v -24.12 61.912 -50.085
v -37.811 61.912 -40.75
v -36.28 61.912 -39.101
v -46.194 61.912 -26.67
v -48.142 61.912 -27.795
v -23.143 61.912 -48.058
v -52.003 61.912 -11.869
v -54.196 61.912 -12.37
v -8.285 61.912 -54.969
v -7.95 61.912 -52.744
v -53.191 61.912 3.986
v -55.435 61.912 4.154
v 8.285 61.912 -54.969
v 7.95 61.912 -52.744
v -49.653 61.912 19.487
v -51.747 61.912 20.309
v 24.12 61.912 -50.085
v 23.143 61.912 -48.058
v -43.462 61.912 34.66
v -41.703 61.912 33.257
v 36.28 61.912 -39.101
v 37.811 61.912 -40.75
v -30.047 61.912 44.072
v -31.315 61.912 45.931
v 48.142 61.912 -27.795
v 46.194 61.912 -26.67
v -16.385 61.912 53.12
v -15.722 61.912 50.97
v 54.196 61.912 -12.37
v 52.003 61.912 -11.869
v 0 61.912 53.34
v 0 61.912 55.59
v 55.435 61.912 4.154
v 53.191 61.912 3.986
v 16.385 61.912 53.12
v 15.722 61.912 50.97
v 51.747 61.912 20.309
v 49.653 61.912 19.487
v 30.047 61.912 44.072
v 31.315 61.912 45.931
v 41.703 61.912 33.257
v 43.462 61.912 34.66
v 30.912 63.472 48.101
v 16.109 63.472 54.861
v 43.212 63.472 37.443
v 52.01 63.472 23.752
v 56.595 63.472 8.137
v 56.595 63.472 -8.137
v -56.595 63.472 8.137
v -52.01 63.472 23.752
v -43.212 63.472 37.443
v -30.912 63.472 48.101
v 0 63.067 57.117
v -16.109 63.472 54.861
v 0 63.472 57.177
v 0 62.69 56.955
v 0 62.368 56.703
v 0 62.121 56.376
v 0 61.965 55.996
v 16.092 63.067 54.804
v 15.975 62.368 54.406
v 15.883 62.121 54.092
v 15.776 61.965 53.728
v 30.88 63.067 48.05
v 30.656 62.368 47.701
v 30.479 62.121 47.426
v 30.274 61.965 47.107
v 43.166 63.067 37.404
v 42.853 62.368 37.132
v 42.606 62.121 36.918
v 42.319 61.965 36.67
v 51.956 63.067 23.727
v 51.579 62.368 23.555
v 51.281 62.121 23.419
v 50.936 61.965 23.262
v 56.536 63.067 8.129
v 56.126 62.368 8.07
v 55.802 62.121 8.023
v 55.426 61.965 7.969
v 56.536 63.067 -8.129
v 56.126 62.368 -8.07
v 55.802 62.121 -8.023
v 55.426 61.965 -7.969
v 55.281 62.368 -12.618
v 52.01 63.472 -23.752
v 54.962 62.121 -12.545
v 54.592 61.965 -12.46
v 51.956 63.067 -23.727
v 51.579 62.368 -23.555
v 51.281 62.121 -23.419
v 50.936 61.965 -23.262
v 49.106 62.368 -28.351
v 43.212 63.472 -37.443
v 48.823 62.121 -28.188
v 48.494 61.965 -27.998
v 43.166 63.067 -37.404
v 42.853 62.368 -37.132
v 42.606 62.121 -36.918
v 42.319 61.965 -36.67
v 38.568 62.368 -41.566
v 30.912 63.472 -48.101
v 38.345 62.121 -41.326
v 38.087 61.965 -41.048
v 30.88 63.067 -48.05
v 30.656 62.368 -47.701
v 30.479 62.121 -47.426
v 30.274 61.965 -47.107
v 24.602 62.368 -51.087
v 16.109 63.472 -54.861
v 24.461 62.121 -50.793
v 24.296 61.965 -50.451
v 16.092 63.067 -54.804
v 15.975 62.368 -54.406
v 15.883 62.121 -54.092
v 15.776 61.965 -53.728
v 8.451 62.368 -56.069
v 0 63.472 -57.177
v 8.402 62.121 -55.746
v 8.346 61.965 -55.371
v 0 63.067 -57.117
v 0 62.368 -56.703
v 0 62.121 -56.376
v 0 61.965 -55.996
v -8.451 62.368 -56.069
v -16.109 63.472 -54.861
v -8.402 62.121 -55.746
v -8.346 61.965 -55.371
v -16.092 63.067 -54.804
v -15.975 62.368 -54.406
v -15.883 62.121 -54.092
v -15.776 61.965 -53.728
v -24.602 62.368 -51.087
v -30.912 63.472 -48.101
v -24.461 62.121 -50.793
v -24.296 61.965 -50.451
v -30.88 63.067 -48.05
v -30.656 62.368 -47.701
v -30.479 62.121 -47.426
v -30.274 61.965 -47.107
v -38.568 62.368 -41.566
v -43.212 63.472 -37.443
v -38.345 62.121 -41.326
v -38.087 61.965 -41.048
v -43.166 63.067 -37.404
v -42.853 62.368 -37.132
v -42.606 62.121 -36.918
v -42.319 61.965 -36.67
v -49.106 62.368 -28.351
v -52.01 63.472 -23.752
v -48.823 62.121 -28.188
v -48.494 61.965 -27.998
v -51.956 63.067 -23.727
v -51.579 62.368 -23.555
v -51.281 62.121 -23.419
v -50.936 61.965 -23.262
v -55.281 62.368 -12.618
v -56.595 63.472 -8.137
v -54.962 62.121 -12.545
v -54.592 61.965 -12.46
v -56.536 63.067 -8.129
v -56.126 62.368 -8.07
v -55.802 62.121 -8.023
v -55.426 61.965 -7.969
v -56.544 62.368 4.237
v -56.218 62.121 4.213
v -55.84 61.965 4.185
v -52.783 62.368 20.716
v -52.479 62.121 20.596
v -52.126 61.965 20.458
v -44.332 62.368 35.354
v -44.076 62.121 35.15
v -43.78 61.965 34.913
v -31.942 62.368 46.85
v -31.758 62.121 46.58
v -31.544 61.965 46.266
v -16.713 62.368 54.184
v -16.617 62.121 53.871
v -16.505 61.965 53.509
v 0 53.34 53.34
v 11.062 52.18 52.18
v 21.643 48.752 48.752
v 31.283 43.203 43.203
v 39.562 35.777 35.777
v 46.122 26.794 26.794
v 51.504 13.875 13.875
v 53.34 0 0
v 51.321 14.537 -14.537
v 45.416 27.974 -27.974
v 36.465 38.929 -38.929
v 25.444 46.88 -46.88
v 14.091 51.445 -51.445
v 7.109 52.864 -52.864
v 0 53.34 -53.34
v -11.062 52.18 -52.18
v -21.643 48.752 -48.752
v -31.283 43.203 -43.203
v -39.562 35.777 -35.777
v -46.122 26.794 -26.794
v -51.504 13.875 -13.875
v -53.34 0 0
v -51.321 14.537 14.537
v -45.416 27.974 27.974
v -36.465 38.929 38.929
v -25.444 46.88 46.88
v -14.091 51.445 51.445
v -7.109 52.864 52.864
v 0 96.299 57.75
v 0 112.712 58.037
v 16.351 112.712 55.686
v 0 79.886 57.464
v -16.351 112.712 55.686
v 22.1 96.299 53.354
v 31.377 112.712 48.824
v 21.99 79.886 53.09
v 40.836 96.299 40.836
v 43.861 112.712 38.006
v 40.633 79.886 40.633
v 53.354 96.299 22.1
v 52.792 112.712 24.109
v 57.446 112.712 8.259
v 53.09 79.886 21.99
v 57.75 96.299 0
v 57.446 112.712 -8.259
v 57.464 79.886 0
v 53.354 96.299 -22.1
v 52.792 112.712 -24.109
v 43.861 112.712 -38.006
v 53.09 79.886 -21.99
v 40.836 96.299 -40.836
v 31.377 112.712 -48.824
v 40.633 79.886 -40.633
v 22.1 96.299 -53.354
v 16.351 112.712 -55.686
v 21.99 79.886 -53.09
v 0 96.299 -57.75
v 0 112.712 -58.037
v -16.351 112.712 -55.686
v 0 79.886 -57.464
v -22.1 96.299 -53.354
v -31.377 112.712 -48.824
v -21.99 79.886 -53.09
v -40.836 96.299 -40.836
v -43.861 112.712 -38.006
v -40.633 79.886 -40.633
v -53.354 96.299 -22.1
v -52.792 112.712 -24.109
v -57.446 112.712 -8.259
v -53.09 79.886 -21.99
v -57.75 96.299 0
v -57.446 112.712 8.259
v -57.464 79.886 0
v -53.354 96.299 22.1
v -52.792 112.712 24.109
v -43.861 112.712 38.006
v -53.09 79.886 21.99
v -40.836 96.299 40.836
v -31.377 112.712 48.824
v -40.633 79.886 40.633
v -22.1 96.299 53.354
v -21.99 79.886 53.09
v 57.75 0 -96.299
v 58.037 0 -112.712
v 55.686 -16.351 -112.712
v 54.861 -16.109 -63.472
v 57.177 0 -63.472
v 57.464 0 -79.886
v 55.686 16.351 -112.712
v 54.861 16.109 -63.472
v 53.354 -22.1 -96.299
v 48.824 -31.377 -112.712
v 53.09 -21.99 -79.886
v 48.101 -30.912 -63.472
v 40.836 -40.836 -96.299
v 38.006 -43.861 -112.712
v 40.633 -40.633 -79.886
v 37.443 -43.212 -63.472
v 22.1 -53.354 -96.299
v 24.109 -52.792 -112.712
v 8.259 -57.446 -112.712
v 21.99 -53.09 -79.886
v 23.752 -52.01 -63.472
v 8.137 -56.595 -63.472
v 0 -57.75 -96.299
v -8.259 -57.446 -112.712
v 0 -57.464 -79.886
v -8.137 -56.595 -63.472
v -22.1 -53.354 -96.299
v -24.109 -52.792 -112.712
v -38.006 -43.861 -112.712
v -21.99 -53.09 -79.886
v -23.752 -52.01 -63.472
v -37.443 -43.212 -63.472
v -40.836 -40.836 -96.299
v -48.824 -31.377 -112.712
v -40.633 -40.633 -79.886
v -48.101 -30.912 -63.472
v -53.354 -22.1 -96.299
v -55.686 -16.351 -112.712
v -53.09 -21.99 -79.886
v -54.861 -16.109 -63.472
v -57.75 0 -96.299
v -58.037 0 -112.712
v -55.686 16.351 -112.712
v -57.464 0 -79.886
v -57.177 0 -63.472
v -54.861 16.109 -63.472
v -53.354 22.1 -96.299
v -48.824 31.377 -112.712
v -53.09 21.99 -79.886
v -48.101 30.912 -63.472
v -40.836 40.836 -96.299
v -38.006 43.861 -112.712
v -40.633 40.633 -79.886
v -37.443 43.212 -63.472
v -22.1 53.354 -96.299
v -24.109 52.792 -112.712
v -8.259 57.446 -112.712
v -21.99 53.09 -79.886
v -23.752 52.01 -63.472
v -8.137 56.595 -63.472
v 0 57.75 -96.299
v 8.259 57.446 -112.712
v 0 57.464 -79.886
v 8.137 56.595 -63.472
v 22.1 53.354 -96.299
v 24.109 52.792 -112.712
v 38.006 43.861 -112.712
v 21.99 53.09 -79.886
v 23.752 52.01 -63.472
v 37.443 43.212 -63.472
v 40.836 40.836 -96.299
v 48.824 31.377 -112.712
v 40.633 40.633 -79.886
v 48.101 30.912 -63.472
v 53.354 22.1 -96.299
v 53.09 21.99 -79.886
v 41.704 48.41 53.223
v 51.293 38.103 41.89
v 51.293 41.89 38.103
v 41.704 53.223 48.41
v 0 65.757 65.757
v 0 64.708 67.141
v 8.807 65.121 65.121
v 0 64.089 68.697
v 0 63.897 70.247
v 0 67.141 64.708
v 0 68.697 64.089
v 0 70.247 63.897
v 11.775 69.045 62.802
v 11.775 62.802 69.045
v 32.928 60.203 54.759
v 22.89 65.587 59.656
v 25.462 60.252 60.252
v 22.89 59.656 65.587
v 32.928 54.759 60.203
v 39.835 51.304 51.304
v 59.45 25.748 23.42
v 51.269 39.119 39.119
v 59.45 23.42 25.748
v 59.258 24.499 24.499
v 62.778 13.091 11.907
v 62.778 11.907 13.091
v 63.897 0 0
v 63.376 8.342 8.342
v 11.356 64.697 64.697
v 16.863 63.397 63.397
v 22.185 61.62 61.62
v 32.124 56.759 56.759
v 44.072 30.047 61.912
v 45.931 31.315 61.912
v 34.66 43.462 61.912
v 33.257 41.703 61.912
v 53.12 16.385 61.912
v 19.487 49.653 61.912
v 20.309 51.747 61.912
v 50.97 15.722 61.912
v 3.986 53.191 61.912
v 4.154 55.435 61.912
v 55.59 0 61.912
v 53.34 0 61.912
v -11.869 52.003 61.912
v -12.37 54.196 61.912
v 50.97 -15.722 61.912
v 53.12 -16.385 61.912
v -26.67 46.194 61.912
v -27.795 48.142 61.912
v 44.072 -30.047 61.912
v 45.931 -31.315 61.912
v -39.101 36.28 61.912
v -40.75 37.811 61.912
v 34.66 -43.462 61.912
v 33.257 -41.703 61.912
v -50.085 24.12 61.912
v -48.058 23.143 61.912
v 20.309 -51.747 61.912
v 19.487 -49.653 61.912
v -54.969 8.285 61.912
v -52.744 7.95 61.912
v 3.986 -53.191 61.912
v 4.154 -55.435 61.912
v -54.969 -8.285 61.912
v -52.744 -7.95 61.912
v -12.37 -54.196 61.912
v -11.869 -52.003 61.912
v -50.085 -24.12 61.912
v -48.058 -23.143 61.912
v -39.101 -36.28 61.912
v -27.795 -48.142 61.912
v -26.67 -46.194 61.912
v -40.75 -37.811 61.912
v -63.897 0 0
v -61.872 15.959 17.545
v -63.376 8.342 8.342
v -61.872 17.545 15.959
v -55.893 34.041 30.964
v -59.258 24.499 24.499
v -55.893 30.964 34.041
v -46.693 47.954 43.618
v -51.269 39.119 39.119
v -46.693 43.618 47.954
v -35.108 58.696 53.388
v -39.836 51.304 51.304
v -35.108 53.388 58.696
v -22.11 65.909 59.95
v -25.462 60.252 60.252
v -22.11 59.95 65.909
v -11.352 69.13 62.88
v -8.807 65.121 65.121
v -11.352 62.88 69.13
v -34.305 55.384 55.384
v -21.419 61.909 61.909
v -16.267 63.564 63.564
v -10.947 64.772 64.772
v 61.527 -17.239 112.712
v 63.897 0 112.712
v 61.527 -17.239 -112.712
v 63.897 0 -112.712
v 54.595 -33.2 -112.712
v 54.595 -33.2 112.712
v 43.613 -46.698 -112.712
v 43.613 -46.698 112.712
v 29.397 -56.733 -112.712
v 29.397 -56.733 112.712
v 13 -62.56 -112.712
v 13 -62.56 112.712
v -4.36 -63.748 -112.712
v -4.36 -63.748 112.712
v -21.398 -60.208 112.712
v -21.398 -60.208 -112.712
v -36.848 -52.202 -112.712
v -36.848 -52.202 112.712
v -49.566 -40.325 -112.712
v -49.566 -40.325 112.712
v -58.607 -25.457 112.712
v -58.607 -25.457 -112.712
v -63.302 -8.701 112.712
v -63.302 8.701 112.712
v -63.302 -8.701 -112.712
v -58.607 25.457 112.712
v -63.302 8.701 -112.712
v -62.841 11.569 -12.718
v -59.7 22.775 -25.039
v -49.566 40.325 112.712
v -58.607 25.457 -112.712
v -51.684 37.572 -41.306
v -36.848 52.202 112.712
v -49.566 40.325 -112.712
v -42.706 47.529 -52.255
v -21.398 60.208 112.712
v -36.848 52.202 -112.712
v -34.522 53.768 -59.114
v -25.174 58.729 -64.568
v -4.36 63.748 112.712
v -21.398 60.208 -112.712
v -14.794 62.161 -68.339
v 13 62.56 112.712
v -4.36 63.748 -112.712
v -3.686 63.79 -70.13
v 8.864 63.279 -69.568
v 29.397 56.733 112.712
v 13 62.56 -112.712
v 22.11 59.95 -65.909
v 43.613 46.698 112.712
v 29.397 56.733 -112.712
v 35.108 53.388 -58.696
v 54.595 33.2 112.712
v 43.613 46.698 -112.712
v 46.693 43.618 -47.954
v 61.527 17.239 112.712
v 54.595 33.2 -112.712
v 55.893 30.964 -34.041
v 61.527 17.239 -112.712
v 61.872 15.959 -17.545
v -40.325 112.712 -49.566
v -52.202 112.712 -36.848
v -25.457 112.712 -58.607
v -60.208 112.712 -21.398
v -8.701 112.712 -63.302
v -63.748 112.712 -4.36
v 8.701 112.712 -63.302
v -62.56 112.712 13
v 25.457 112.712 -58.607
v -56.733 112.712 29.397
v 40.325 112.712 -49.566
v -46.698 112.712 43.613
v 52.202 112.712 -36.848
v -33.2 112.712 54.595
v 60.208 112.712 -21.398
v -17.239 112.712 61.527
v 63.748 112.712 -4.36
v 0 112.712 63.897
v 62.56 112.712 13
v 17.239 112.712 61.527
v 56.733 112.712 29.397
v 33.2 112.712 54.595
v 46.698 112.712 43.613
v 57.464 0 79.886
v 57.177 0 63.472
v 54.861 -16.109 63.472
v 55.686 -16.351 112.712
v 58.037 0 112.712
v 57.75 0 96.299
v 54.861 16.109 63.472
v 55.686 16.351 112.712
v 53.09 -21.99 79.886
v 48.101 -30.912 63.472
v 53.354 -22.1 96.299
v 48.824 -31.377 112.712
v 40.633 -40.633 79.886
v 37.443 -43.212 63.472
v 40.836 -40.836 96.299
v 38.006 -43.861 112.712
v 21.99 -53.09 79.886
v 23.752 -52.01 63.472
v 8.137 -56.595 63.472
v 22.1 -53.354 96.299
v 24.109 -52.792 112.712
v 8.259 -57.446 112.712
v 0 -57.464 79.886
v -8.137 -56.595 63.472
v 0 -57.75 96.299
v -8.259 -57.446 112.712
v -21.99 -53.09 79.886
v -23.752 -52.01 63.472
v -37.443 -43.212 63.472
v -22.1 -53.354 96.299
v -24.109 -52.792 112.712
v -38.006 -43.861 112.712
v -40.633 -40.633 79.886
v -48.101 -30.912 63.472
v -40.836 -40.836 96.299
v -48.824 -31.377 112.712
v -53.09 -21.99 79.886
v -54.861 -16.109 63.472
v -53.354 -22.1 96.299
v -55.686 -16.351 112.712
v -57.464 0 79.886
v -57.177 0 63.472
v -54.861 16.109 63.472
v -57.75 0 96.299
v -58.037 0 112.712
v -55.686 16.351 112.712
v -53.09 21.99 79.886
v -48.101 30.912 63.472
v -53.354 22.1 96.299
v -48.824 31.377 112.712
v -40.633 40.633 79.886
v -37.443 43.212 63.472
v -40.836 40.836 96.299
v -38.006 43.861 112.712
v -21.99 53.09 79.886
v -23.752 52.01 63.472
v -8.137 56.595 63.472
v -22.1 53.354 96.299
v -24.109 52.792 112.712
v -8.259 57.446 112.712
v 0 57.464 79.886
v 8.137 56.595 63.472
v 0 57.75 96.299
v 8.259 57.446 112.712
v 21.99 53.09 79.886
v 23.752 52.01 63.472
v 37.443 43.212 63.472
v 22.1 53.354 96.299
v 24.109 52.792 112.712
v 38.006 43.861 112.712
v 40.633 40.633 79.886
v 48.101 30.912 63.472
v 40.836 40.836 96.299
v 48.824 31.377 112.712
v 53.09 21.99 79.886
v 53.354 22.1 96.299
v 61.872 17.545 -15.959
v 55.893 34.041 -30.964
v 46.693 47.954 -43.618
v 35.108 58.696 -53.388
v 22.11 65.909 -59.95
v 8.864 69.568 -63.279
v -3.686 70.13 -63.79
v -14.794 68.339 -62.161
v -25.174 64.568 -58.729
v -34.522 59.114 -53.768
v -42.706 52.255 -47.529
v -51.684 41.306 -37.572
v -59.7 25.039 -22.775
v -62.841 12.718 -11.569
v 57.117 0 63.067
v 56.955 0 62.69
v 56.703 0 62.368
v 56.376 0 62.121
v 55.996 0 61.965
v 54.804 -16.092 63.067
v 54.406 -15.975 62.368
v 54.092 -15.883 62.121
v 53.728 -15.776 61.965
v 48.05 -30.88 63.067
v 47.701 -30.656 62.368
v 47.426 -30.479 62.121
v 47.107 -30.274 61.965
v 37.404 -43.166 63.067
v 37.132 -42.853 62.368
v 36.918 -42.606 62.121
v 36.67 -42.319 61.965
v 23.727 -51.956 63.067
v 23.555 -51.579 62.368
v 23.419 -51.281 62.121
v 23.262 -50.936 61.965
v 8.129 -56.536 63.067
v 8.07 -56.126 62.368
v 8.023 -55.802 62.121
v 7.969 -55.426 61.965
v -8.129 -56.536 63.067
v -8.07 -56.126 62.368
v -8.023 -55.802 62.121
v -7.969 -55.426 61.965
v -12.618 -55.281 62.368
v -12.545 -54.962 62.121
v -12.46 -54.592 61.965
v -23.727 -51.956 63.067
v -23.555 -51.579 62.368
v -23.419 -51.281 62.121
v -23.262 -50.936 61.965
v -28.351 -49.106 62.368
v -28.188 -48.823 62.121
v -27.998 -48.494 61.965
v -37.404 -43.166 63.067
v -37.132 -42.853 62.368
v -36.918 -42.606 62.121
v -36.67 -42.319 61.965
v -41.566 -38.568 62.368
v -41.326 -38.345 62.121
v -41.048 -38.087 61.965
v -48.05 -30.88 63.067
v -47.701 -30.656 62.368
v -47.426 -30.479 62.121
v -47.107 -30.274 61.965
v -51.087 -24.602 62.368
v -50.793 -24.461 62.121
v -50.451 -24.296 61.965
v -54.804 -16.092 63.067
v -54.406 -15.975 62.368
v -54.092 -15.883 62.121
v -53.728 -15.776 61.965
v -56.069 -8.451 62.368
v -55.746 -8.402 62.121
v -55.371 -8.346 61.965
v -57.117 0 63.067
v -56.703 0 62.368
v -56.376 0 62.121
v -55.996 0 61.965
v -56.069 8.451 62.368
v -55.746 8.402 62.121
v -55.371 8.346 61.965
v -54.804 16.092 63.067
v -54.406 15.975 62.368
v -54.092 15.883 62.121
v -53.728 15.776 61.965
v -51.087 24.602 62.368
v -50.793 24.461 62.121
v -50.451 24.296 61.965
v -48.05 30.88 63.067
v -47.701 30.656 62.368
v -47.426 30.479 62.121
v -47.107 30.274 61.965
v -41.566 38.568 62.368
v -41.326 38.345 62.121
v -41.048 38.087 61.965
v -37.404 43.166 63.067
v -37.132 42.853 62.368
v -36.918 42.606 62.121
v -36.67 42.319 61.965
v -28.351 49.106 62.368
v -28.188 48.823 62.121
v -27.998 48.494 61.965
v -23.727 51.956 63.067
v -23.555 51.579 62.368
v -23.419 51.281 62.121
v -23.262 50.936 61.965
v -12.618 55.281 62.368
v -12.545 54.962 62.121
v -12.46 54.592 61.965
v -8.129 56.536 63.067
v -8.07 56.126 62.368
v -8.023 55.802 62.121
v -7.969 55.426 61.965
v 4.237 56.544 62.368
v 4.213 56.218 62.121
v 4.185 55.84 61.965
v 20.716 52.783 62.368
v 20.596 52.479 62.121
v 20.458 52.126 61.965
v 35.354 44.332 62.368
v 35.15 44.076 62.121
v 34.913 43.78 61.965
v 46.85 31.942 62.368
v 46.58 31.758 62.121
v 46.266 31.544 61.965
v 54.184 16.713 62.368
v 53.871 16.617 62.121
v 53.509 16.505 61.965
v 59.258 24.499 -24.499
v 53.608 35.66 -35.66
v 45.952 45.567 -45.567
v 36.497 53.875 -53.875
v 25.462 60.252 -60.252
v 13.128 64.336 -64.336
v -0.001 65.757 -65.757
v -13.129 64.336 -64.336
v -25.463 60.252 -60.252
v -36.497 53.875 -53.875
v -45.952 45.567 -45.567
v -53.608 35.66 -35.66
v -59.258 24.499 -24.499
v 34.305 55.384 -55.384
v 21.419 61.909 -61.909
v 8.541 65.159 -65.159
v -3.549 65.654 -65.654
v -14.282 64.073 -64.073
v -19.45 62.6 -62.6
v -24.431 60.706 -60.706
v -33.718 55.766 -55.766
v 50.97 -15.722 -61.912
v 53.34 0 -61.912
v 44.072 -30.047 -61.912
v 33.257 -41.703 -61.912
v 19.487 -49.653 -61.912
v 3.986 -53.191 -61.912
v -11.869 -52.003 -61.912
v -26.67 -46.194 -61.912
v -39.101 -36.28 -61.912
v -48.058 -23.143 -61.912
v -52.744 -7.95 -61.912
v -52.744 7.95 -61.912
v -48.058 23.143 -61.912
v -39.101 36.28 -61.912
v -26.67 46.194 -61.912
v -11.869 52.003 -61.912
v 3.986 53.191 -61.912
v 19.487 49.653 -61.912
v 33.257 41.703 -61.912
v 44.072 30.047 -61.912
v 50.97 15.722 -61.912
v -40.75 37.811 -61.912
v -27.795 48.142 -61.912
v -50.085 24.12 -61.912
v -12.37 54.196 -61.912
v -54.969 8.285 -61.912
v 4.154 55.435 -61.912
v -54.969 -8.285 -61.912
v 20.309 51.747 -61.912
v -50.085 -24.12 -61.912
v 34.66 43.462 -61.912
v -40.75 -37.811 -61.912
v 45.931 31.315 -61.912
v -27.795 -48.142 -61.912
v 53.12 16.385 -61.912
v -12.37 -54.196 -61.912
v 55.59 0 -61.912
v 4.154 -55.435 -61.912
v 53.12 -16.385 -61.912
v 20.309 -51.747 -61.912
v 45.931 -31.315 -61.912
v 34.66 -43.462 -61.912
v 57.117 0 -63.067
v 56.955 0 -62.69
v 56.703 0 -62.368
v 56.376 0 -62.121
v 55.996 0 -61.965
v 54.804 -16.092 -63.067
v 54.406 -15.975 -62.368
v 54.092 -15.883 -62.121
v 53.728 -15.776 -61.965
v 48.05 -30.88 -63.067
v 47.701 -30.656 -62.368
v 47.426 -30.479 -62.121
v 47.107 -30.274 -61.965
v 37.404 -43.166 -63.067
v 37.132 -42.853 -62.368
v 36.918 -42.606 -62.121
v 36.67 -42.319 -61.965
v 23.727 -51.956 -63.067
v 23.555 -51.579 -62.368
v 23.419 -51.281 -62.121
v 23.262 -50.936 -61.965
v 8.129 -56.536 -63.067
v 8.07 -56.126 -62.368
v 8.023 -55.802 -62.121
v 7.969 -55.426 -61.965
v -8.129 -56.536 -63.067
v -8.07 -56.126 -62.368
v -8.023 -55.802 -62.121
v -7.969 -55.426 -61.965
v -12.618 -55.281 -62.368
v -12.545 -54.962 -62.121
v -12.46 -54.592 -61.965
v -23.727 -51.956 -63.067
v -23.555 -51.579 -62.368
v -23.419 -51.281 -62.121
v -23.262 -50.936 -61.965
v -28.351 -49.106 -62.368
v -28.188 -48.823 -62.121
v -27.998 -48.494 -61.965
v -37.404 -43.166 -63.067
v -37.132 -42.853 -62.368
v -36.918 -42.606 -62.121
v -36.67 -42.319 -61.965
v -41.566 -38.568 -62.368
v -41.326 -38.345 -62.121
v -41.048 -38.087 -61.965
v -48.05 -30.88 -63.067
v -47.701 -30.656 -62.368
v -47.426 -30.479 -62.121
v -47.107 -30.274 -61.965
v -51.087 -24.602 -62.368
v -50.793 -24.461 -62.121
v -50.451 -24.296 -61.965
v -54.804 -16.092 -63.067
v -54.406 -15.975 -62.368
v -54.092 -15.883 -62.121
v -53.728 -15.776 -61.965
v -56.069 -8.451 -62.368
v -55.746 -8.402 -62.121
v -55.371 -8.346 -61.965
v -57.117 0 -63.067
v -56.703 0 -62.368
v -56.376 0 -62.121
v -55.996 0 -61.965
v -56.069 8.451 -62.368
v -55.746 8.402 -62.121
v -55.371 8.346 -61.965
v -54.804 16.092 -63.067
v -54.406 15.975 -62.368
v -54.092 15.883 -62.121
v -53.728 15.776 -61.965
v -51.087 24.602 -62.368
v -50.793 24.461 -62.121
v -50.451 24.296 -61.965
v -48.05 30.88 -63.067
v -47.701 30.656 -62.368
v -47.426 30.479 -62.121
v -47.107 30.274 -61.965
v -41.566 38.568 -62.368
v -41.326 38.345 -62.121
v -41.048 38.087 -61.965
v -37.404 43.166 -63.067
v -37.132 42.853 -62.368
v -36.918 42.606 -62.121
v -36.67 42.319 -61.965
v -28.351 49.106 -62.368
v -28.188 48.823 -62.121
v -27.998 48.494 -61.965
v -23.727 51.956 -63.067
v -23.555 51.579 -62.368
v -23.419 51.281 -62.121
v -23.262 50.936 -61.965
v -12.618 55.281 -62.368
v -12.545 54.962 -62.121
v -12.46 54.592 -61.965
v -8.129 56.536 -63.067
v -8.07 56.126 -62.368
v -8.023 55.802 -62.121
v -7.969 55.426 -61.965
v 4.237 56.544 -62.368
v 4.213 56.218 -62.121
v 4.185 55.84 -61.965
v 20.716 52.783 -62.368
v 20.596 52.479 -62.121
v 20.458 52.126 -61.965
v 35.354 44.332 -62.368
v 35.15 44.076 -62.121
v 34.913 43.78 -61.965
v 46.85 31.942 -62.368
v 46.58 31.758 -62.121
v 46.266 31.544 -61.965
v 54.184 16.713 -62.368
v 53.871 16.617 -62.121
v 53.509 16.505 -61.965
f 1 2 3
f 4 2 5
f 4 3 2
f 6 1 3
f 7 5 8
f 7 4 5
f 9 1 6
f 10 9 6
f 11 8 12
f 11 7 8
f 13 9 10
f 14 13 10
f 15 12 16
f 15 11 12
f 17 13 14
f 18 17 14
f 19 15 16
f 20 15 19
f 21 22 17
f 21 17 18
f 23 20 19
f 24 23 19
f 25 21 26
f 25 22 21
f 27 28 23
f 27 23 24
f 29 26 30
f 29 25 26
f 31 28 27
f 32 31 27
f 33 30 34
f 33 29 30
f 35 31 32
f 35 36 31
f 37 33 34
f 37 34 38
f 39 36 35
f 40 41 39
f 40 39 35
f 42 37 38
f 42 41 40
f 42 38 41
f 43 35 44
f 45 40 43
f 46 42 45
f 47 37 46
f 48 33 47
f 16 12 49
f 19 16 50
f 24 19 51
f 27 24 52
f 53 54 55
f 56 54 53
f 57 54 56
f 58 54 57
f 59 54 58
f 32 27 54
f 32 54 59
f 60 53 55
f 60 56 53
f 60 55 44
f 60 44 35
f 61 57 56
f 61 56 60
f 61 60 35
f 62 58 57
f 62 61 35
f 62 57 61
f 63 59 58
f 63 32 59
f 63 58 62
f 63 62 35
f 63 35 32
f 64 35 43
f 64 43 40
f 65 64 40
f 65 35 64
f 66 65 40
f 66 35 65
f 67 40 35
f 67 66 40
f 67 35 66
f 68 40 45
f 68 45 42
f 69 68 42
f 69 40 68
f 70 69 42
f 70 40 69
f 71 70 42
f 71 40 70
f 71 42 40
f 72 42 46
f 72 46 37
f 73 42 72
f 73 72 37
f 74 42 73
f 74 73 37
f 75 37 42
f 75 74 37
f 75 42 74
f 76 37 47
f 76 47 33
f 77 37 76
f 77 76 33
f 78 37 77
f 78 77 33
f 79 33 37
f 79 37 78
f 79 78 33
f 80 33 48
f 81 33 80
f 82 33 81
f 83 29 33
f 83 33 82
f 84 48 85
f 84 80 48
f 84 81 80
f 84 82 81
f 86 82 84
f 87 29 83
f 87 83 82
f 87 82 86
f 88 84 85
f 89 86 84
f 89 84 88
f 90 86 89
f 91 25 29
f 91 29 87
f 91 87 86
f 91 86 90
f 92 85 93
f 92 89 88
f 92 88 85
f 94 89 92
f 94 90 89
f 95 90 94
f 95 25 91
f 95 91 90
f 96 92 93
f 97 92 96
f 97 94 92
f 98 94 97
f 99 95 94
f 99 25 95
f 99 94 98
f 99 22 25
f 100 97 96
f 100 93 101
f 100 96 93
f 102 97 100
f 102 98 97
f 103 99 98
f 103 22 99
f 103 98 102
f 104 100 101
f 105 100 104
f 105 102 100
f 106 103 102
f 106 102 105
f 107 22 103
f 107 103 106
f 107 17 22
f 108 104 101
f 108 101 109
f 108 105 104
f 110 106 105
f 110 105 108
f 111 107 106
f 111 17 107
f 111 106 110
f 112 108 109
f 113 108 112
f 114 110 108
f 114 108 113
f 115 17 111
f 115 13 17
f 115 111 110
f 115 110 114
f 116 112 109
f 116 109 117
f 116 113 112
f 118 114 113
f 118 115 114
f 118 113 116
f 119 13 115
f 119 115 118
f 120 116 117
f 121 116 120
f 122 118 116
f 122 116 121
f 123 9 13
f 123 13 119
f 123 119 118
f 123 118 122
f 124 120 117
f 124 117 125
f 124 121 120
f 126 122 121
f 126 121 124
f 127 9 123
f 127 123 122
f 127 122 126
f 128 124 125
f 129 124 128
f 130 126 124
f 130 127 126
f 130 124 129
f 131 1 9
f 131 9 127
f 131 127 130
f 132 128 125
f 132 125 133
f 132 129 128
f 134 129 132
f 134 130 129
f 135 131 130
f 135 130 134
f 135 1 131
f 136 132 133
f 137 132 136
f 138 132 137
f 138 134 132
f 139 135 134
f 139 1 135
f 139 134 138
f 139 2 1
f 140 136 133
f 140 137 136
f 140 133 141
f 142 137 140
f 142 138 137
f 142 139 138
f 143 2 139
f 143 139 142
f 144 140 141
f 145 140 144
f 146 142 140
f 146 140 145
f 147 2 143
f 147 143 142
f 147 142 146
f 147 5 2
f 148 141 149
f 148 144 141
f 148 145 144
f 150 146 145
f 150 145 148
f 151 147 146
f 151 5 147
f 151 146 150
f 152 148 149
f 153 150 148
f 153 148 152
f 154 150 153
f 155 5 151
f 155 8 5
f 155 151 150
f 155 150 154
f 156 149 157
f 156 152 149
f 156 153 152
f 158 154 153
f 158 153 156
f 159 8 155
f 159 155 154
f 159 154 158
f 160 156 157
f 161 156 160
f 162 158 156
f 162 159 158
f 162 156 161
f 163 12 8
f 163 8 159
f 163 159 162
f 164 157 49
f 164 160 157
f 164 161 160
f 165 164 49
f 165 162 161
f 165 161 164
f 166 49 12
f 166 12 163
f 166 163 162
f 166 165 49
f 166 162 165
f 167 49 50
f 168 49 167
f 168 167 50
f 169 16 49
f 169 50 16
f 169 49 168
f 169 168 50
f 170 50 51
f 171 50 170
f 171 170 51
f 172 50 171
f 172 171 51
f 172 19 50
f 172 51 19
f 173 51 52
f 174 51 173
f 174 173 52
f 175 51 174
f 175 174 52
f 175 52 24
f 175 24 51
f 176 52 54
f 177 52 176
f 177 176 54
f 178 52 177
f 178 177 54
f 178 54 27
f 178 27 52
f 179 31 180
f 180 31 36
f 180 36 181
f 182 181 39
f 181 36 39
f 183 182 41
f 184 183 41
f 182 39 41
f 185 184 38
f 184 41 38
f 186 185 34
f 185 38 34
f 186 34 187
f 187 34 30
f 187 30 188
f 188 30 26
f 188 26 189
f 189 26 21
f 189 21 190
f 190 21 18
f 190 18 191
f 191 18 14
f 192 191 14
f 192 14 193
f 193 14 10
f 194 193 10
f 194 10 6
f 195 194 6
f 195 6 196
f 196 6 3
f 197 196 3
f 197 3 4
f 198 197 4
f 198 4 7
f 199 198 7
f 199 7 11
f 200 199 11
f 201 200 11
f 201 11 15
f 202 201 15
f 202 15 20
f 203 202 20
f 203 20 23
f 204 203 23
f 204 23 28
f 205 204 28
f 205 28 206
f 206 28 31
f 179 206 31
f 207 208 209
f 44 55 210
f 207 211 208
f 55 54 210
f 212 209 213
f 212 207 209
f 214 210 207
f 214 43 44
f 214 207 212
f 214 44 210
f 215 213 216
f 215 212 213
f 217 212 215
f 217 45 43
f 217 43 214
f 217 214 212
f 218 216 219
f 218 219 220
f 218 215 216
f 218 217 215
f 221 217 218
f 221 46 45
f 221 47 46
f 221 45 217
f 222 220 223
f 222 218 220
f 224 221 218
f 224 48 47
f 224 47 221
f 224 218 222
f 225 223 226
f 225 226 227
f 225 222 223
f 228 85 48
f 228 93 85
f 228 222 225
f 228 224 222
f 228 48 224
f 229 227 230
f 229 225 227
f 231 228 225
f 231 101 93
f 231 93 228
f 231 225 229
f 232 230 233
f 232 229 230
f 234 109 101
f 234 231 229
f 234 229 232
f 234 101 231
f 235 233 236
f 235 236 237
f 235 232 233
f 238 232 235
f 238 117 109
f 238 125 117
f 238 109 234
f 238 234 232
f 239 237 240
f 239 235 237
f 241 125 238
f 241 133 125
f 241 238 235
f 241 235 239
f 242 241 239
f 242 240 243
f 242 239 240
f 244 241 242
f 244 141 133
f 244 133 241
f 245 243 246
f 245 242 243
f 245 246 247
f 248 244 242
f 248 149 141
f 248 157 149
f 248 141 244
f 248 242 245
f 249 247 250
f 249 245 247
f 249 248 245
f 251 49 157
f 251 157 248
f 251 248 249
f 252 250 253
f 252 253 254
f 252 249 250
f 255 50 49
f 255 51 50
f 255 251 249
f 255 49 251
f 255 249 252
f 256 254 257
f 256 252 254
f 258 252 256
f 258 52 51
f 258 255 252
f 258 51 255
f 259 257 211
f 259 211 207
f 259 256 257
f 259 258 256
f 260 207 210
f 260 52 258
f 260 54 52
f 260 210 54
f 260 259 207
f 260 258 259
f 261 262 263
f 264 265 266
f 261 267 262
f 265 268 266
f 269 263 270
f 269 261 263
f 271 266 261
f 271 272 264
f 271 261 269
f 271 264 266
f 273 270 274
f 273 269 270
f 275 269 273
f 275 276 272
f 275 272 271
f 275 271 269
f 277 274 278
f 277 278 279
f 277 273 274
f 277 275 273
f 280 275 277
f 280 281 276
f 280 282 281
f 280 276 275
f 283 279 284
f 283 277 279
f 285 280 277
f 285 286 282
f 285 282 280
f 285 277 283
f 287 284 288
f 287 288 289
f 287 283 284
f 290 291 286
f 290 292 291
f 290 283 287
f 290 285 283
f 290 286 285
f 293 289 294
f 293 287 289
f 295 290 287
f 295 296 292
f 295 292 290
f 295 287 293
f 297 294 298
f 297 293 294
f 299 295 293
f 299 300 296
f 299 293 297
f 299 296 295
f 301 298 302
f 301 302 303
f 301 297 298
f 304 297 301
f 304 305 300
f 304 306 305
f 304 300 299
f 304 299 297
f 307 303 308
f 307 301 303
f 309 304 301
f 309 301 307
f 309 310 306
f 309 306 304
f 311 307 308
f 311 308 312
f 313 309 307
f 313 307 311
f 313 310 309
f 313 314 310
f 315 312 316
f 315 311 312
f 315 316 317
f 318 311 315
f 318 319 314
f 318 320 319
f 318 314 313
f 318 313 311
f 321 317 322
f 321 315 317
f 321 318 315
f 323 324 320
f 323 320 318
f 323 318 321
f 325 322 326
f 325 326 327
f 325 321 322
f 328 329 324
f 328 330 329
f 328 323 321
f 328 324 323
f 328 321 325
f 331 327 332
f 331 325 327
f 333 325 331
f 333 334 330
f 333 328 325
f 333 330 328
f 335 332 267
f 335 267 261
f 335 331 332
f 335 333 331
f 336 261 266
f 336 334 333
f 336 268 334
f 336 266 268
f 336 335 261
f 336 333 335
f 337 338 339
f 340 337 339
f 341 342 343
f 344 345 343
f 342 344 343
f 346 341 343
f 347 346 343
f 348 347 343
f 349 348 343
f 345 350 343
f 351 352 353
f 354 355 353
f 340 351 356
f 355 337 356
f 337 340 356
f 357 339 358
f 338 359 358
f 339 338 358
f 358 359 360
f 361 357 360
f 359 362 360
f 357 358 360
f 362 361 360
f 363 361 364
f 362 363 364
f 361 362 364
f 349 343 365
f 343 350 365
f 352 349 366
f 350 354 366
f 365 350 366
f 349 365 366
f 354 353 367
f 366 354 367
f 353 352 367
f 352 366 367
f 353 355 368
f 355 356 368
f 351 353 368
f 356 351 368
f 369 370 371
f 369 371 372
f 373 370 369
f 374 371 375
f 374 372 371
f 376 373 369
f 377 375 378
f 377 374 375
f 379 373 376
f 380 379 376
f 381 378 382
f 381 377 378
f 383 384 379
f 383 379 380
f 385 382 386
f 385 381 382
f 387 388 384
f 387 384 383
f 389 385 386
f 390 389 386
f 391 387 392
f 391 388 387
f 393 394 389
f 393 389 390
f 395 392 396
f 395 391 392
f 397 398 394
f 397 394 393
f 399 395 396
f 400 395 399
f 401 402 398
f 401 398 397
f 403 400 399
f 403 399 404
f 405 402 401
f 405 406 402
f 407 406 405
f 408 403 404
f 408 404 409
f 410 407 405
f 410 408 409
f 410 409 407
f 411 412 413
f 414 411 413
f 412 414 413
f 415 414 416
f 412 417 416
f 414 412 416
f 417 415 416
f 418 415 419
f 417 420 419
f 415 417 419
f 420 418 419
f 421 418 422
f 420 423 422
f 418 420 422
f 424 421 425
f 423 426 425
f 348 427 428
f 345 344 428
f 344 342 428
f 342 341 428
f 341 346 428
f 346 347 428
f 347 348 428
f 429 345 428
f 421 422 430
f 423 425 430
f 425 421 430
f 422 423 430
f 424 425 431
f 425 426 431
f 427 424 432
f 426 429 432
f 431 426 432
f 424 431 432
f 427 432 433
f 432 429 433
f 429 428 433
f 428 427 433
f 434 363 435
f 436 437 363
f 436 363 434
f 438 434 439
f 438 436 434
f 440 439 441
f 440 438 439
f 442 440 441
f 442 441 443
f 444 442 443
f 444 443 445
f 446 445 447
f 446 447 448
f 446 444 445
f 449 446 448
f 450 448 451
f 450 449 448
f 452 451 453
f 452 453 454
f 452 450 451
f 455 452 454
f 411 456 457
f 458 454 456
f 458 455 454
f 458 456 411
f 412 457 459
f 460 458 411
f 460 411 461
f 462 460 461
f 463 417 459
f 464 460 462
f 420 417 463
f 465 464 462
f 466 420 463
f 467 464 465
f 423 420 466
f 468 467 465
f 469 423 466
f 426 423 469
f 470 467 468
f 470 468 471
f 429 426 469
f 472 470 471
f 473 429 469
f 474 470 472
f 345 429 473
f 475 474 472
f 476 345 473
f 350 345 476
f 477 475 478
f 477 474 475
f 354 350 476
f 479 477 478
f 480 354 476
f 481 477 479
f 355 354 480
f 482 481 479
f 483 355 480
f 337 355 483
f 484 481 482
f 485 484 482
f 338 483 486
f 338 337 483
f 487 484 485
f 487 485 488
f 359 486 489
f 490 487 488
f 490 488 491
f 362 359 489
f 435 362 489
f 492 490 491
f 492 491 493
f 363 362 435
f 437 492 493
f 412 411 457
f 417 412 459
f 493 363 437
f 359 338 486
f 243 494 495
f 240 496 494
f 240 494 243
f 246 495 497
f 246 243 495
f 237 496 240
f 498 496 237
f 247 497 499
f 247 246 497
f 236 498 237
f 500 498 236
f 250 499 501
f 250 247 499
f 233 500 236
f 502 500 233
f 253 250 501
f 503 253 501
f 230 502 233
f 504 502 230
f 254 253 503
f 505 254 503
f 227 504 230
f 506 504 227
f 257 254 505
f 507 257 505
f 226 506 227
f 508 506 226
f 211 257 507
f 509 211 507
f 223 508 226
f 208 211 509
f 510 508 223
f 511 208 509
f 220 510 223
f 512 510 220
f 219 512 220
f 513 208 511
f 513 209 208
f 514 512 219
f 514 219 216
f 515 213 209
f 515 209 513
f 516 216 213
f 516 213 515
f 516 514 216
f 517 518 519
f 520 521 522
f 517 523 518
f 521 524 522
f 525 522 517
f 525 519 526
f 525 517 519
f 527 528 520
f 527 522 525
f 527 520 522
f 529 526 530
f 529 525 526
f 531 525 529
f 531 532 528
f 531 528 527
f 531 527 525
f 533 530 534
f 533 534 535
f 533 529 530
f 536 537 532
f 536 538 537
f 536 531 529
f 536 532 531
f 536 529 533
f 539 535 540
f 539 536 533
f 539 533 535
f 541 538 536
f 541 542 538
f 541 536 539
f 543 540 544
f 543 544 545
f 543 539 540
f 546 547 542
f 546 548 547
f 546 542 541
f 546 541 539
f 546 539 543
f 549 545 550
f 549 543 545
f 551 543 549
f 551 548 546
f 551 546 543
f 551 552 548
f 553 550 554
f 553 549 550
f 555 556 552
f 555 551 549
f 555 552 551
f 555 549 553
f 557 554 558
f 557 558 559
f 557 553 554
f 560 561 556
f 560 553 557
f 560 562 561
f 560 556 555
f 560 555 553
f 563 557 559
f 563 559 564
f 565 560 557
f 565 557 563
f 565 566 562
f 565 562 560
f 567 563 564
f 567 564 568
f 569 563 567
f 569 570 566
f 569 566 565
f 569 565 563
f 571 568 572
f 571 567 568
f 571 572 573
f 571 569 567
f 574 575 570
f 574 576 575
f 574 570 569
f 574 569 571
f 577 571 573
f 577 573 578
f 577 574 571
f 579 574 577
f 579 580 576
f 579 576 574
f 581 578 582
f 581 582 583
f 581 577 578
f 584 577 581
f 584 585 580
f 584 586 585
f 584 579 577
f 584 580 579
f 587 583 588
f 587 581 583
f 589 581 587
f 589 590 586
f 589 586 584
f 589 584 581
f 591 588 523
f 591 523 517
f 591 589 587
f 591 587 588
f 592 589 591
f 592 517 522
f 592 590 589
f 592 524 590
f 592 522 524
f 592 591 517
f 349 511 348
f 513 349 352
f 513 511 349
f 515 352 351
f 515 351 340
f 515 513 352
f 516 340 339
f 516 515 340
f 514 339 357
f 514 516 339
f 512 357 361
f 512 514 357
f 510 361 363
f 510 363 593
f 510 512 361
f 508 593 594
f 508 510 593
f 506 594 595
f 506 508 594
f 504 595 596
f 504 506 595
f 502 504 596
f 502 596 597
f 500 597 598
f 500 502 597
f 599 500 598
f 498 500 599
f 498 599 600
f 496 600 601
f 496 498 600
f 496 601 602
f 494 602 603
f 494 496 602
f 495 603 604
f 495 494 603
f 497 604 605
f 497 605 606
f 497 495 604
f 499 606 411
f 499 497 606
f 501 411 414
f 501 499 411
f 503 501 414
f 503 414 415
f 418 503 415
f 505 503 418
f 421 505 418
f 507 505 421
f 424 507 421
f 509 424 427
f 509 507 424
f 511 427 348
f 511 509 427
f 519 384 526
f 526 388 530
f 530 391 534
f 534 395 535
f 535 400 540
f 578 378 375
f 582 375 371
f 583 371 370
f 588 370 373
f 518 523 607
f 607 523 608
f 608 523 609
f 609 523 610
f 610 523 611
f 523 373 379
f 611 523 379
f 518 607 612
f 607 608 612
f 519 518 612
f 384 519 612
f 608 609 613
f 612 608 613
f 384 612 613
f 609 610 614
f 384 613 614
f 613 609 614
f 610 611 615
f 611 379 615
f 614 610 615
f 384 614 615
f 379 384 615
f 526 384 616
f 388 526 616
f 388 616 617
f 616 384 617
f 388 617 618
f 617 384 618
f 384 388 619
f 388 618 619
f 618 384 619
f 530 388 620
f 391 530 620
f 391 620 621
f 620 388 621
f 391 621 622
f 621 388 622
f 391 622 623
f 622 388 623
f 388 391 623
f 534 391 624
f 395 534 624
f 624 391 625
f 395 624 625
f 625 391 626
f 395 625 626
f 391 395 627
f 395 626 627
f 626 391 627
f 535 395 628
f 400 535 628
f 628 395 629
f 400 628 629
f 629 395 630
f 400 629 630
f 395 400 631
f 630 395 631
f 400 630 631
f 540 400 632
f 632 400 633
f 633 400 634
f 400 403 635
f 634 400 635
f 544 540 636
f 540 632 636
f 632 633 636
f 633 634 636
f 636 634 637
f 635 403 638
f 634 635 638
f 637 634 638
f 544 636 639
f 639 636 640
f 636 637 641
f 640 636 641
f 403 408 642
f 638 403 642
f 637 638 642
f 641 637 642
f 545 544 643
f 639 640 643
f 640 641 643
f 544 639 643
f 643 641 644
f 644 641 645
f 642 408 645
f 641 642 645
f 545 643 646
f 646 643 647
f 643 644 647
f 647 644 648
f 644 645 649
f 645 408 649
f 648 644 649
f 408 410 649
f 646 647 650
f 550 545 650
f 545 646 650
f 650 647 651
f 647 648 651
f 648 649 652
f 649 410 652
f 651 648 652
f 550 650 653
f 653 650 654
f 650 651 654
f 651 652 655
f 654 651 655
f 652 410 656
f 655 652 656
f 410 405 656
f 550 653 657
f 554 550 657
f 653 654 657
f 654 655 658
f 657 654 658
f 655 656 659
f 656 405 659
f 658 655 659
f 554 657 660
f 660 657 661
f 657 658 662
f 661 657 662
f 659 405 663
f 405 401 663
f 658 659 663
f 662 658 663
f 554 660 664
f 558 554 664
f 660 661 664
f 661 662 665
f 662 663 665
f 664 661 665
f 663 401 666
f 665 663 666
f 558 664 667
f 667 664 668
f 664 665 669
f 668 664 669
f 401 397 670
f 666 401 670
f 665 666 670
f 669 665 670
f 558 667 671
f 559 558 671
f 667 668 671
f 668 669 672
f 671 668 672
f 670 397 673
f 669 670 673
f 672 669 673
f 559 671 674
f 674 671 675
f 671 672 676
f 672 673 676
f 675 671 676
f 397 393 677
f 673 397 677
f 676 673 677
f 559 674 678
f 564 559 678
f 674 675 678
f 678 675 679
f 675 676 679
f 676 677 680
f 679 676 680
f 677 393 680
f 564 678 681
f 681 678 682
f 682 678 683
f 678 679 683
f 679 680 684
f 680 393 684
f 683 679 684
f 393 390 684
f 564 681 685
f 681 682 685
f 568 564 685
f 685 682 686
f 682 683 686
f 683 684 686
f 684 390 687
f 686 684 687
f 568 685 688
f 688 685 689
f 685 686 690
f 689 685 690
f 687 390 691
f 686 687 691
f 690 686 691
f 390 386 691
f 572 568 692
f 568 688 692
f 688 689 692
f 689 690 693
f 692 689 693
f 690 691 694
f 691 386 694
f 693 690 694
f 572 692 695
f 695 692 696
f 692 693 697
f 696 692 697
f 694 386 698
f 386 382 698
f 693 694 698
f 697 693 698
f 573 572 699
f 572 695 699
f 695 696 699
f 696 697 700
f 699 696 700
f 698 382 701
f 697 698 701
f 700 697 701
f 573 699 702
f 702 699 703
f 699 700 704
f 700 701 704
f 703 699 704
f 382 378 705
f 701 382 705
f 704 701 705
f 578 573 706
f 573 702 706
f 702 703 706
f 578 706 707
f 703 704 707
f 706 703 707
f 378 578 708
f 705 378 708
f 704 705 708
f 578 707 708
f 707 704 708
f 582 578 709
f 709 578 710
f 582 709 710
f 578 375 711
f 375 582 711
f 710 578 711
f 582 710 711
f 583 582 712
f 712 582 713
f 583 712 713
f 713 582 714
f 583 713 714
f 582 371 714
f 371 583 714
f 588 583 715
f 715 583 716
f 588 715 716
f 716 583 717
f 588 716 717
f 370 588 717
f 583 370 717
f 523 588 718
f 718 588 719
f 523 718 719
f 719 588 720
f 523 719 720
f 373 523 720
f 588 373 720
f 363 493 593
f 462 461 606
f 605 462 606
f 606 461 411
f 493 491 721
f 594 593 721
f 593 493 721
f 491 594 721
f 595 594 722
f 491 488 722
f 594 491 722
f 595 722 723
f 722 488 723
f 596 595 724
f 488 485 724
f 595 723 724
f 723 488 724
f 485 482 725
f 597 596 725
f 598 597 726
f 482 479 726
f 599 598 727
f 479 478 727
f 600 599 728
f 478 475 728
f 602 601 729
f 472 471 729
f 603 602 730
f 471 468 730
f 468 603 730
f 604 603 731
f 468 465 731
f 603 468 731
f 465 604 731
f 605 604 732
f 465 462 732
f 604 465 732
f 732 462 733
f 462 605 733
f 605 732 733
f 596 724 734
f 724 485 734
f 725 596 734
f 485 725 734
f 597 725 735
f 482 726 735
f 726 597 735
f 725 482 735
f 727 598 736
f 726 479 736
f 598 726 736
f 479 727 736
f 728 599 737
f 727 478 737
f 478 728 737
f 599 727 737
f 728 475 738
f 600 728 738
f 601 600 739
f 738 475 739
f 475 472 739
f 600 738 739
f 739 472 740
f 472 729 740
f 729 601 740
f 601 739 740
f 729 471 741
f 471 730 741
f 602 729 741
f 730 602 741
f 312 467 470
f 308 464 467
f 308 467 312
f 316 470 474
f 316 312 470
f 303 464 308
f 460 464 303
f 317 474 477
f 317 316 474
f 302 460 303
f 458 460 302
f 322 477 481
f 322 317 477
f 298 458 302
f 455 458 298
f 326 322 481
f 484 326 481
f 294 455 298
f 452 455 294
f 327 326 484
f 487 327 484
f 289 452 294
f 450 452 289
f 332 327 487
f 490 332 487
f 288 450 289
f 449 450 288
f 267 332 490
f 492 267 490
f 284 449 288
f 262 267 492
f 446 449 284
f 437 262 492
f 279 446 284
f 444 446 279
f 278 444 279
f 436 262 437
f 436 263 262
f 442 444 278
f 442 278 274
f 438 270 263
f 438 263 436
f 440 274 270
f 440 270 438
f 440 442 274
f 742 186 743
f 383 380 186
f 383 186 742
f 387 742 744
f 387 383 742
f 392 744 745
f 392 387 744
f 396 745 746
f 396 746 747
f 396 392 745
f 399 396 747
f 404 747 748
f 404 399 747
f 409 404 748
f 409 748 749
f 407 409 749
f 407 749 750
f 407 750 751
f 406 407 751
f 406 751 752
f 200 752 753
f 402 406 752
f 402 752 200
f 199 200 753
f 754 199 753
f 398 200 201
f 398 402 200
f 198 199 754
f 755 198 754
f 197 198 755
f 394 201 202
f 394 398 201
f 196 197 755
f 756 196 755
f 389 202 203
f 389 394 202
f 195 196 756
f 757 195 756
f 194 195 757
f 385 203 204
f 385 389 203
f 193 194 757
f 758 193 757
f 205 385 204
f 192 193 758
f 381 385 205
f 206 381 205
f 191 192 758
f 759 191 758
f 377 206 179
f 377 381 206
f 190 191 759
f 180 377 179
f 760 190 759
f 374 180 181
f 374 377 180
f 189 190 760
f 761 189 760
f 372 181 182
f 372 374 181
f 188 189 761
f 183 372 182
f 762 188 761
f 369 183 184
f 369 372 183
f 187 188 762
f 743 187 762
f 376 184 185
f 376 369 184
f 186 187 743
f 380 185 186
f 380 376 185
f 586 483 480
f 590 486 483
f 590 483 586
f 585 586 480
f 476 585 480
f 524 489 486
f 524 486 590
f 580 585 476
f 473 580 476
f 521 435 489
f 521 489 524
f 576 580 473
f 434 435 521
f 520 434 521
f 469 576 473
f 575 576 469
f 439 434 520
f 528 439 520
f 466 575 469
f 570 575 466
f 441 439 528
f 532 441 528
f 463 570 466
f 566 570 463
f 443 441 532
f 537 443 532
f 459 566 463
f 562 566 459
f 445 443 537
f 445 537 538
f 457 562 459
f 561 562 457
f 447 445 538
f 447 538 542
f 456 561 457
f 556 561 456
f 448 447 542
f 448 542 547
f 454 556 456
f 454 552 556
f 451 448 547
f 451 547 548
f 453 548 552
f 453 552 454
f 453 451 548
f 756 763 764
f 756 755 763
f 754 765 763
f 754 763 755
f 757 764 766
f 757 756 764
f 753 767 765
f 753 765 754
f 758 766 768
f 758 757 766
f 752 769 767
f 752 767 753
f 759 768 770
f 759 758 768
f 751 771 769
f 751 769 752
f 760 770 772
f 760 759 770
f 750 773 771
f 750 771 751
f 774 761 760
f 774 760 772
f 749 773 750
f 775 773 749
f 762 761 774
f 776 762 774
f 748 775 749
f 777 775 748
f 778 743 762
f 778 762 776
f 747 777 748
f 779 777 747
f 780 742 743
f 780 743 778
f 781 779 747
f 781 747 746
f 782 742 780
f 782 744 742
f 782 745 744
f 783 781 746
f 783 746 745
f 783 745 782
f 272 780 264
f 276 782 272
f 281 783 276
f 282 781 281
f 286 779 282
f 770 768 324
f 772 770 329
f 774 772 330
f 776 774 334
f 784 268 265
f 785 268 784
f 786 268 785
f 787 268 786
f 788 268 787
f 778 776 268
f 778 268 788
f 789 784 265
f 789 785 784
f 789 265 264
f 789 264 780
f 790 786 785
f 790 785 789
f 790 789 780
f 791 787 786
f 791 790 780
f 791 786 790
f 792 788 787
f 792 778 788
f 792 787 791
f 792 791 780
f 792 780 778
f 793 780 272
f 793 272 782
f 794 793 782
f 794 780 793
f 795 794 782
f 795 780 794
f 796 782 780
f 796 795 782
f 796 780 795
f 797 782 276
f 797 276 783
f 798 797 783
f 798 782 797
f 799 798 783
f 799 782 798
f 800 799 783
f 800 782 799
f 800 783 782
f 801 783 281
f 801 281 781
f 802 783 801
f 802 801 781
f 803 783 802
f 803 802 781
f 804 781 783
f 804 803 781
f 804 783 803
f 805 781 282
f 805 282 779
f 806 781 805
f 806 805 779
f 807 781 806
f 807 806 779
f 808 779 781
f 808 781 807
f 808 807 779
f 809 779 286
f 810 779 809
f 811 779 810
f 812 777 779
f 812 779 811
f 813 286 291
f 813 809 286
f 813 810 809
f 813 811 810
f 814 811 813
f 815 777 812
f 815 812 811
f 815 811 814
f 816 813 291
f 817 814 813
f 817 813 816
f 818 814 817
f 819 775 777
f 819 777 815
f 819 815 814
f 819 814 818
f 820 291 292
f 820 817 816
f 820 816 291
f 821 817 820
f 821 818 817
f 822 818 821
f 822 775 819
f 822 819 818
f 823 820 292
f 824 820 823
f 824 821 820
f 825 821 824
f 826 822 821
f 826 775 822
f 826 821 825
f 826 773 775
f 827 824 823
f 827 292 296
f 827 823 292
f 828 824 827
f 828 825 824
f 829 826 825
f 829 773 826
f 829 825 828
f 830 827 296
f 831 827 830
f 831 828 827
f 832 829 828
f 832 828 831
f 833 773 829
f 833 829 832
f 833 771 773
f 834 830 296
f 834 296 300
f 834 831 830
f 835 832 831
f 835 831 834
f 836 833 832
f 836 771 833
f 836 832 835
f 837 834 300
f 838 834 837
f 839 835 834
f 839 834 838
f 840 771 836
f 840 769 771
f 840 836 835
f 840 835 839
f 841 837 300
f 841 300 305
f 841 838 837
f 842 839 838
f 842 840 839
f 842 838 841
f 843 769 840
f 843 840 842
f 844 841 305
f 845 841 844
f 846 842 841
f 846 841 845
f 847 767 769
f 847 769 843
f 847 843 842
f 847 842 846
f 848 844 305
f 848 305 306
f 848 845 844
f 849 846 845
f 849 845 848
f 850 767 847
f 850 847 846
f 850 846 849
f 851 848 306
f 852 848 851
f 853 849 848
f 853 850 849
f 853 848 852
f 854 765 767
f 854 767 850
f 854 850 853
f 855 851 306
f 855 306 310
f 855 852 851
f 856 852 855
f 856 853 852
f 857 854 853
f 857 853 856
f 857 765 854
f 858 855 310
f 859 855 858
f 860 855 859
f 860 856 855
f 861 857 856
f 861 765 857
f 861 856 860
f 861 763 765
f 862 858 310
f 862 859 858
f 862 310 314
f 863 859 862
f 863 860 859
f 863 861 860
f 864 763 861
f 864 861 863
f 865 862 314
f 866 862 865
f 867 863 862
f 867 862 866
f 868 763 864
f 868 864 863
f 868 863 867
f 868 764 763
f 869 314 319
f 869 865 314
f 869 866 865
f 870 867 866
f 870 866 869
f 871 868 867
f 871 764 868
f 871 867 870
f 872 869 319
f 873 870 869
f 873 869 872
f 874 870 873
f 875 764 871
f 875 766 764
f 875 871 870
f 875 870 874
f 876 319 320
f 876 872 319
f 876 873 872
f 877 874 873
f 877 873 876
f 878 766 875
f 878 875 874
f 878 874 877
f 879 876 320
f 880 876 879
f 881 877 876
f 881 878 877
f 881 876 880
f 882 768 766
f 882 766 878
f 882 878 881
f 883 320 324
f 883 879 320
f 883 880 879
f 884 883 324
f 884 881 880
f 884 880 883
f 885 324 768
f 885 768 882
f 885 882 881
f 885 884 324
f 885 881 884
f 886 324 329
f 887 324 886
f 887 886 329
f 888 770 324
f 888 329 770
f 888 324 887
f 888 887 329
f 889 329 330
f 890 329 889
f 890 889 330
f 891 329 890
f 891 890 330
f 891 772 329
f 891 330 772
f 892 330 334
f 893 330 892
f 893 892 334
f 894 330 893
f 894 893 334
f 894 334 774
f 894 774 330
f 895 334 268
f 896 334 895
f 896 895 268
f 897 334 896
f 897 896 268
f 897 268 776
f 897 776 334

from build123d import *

# Parameters (mm, degrees)
BOSS_EXTRUDE1_REACH      = 178.609
BOSS_EXTRUDE1_END_RADIUS = 63.896875
SKETCH2_R                = 63.896875
CUT_EXTRUDE1_REACH       = 127.809
CUT_EXTRUDE1_END_RADIUS  = 53.34
SKETCH4_R                = 53.34
FILLET1_R                = 1.5875
FILLET2_R                = 6.35


with BuildPart() as part:
    # Sketch1 → Revolve1 (revolve)
    with BuildSketch(Plane(origin=(0, 0, 0), x_dir=(0, 0, -1), z_dir=(1, 0, 0)), mode=Mode.PRIVATE) as revolve1_sk:
        Polygon((-112.7125, 63.896875), (112.7125, 63.896875), (112.7125, 58.036717298), (61.9125, 57.15), (61.9125, 53.34), (-61.9125, 53.34), (-61.9125, 57.15), (-112.7125, 58.036717298), align=None)
    revolve(revolve1_sk.sketch.rotate(Axis((0, 0, 168.705111385), (0, 0, -1)), 90), axis=Axis((0, 0, 168.705111385), (0, 0, -1)))  # turned: the seam where the file's is

    # Boss-Extrude1: up to this cylinder (the profile starts outside it)
    boss_extrude1_end = Plane(origin=(0, 0, 0), z_dir=(0, 0, 1)) * Cylinder(BOSS_EXTRUDE1_END_RADIUS, 486.01175, mode=Mode.PRIVATE)
    # Sketch2 → Boss-Extrude1 (add, up to the surface)
    with BuildSketch(Plane(origin=(0, 112.7125, 0), x_dir=(1, 0, 0), z_dir=(0, 1, 0)), mode=Mode.PRIVATE) as boss_extrude1_sk1:
        with Locations(Location((0, 0, 0), (0, 0, 270))):  # turned: the seam where the file's is
            Circle(SKETCH2_R)
    boss_extrude1_tool1 = extrude(boss_extrude1_sk1.sketch, amount=-BOSS_EXTRUDE1_REACH, mode=Mode.PRIVATE) - boss_extrude1_end
    add(boss_extrude1_tool1.solids().sort_by_distance((0, 112.7125, 0))[0])

    # Sketch3 → Cut-Revolve1 (revolve, cut)
    with BuildSketch(Plane(origin=(0, 0, 0), x_dir=(0, 0, -1), z_dir=(1, 0, 0))):
        Polygon((-58.036717298, 112.7125), (-57.15, 61.9125), (0, 61.9125), (0, 112.7125), align=None)
    revolve(axis=Axis((0, 0, 0), (0, 1, 0)), mode=Mode.SUBTRACT)

    # Cut-Extrude1: up to this cylinder (the profile starts outside it)
    cut_extrude1_end = Plane(origin=(0, 0, 0), z_dir=(0, 0, 1)) * Cylinder(CUT_EXTRUDE1_END_RADIUS, 363.298, mode=Mode.PRIVATE)
    # Sketch4 → Cut-Extrude1 (cut, up to the surface)
    with BuildSketch(Plane(origin=(0, 61.9125, 0), x_dir=(1, 0, 0), z_dir=(0, 1, 0)), mode=Mode.PRIVATE) as cut_extrude1_sk1:
        with Locations(Location((0, 0, 0), (0, 0, 270))):  # turned: the seam where the file's is
            Circle(SKETCH4_R)
    cut_extrude1_tool1 = extrude(cut_extrude1_sk1.sketch, amount=-CUT_EXTRUDE1_REACH, mode=Mode.PRIVATE) - cut_extrude1_end
    add(cut_extrude1_tool1.solids().sort_by_distance((0, 61.9125, 0))[0], mode=Mode.SUBTRACT)

    # Fillet1
    fillet1_edges = [part.edges().sort_by_distance(p)[0] for p in [
        (0, 61.9125, -57.15),
        (-57.15, 0, 61.9125),
        (-57.15, 0, -61.9125),
    ]]
    fillet(fillet1_edges, radius=FILLET1_R)

    # Fillet2
    fillet2_edges = [part.edges().sort_by_distance(p)[0] for p in [
        (48.772230172, 41.280506281, 41.280506281),
        (-48.772230172, 41.280506281, -41.280506281),
    ]]
    fillet(fillet2_edges, radius=FILLET2_R)


solid = part.part
